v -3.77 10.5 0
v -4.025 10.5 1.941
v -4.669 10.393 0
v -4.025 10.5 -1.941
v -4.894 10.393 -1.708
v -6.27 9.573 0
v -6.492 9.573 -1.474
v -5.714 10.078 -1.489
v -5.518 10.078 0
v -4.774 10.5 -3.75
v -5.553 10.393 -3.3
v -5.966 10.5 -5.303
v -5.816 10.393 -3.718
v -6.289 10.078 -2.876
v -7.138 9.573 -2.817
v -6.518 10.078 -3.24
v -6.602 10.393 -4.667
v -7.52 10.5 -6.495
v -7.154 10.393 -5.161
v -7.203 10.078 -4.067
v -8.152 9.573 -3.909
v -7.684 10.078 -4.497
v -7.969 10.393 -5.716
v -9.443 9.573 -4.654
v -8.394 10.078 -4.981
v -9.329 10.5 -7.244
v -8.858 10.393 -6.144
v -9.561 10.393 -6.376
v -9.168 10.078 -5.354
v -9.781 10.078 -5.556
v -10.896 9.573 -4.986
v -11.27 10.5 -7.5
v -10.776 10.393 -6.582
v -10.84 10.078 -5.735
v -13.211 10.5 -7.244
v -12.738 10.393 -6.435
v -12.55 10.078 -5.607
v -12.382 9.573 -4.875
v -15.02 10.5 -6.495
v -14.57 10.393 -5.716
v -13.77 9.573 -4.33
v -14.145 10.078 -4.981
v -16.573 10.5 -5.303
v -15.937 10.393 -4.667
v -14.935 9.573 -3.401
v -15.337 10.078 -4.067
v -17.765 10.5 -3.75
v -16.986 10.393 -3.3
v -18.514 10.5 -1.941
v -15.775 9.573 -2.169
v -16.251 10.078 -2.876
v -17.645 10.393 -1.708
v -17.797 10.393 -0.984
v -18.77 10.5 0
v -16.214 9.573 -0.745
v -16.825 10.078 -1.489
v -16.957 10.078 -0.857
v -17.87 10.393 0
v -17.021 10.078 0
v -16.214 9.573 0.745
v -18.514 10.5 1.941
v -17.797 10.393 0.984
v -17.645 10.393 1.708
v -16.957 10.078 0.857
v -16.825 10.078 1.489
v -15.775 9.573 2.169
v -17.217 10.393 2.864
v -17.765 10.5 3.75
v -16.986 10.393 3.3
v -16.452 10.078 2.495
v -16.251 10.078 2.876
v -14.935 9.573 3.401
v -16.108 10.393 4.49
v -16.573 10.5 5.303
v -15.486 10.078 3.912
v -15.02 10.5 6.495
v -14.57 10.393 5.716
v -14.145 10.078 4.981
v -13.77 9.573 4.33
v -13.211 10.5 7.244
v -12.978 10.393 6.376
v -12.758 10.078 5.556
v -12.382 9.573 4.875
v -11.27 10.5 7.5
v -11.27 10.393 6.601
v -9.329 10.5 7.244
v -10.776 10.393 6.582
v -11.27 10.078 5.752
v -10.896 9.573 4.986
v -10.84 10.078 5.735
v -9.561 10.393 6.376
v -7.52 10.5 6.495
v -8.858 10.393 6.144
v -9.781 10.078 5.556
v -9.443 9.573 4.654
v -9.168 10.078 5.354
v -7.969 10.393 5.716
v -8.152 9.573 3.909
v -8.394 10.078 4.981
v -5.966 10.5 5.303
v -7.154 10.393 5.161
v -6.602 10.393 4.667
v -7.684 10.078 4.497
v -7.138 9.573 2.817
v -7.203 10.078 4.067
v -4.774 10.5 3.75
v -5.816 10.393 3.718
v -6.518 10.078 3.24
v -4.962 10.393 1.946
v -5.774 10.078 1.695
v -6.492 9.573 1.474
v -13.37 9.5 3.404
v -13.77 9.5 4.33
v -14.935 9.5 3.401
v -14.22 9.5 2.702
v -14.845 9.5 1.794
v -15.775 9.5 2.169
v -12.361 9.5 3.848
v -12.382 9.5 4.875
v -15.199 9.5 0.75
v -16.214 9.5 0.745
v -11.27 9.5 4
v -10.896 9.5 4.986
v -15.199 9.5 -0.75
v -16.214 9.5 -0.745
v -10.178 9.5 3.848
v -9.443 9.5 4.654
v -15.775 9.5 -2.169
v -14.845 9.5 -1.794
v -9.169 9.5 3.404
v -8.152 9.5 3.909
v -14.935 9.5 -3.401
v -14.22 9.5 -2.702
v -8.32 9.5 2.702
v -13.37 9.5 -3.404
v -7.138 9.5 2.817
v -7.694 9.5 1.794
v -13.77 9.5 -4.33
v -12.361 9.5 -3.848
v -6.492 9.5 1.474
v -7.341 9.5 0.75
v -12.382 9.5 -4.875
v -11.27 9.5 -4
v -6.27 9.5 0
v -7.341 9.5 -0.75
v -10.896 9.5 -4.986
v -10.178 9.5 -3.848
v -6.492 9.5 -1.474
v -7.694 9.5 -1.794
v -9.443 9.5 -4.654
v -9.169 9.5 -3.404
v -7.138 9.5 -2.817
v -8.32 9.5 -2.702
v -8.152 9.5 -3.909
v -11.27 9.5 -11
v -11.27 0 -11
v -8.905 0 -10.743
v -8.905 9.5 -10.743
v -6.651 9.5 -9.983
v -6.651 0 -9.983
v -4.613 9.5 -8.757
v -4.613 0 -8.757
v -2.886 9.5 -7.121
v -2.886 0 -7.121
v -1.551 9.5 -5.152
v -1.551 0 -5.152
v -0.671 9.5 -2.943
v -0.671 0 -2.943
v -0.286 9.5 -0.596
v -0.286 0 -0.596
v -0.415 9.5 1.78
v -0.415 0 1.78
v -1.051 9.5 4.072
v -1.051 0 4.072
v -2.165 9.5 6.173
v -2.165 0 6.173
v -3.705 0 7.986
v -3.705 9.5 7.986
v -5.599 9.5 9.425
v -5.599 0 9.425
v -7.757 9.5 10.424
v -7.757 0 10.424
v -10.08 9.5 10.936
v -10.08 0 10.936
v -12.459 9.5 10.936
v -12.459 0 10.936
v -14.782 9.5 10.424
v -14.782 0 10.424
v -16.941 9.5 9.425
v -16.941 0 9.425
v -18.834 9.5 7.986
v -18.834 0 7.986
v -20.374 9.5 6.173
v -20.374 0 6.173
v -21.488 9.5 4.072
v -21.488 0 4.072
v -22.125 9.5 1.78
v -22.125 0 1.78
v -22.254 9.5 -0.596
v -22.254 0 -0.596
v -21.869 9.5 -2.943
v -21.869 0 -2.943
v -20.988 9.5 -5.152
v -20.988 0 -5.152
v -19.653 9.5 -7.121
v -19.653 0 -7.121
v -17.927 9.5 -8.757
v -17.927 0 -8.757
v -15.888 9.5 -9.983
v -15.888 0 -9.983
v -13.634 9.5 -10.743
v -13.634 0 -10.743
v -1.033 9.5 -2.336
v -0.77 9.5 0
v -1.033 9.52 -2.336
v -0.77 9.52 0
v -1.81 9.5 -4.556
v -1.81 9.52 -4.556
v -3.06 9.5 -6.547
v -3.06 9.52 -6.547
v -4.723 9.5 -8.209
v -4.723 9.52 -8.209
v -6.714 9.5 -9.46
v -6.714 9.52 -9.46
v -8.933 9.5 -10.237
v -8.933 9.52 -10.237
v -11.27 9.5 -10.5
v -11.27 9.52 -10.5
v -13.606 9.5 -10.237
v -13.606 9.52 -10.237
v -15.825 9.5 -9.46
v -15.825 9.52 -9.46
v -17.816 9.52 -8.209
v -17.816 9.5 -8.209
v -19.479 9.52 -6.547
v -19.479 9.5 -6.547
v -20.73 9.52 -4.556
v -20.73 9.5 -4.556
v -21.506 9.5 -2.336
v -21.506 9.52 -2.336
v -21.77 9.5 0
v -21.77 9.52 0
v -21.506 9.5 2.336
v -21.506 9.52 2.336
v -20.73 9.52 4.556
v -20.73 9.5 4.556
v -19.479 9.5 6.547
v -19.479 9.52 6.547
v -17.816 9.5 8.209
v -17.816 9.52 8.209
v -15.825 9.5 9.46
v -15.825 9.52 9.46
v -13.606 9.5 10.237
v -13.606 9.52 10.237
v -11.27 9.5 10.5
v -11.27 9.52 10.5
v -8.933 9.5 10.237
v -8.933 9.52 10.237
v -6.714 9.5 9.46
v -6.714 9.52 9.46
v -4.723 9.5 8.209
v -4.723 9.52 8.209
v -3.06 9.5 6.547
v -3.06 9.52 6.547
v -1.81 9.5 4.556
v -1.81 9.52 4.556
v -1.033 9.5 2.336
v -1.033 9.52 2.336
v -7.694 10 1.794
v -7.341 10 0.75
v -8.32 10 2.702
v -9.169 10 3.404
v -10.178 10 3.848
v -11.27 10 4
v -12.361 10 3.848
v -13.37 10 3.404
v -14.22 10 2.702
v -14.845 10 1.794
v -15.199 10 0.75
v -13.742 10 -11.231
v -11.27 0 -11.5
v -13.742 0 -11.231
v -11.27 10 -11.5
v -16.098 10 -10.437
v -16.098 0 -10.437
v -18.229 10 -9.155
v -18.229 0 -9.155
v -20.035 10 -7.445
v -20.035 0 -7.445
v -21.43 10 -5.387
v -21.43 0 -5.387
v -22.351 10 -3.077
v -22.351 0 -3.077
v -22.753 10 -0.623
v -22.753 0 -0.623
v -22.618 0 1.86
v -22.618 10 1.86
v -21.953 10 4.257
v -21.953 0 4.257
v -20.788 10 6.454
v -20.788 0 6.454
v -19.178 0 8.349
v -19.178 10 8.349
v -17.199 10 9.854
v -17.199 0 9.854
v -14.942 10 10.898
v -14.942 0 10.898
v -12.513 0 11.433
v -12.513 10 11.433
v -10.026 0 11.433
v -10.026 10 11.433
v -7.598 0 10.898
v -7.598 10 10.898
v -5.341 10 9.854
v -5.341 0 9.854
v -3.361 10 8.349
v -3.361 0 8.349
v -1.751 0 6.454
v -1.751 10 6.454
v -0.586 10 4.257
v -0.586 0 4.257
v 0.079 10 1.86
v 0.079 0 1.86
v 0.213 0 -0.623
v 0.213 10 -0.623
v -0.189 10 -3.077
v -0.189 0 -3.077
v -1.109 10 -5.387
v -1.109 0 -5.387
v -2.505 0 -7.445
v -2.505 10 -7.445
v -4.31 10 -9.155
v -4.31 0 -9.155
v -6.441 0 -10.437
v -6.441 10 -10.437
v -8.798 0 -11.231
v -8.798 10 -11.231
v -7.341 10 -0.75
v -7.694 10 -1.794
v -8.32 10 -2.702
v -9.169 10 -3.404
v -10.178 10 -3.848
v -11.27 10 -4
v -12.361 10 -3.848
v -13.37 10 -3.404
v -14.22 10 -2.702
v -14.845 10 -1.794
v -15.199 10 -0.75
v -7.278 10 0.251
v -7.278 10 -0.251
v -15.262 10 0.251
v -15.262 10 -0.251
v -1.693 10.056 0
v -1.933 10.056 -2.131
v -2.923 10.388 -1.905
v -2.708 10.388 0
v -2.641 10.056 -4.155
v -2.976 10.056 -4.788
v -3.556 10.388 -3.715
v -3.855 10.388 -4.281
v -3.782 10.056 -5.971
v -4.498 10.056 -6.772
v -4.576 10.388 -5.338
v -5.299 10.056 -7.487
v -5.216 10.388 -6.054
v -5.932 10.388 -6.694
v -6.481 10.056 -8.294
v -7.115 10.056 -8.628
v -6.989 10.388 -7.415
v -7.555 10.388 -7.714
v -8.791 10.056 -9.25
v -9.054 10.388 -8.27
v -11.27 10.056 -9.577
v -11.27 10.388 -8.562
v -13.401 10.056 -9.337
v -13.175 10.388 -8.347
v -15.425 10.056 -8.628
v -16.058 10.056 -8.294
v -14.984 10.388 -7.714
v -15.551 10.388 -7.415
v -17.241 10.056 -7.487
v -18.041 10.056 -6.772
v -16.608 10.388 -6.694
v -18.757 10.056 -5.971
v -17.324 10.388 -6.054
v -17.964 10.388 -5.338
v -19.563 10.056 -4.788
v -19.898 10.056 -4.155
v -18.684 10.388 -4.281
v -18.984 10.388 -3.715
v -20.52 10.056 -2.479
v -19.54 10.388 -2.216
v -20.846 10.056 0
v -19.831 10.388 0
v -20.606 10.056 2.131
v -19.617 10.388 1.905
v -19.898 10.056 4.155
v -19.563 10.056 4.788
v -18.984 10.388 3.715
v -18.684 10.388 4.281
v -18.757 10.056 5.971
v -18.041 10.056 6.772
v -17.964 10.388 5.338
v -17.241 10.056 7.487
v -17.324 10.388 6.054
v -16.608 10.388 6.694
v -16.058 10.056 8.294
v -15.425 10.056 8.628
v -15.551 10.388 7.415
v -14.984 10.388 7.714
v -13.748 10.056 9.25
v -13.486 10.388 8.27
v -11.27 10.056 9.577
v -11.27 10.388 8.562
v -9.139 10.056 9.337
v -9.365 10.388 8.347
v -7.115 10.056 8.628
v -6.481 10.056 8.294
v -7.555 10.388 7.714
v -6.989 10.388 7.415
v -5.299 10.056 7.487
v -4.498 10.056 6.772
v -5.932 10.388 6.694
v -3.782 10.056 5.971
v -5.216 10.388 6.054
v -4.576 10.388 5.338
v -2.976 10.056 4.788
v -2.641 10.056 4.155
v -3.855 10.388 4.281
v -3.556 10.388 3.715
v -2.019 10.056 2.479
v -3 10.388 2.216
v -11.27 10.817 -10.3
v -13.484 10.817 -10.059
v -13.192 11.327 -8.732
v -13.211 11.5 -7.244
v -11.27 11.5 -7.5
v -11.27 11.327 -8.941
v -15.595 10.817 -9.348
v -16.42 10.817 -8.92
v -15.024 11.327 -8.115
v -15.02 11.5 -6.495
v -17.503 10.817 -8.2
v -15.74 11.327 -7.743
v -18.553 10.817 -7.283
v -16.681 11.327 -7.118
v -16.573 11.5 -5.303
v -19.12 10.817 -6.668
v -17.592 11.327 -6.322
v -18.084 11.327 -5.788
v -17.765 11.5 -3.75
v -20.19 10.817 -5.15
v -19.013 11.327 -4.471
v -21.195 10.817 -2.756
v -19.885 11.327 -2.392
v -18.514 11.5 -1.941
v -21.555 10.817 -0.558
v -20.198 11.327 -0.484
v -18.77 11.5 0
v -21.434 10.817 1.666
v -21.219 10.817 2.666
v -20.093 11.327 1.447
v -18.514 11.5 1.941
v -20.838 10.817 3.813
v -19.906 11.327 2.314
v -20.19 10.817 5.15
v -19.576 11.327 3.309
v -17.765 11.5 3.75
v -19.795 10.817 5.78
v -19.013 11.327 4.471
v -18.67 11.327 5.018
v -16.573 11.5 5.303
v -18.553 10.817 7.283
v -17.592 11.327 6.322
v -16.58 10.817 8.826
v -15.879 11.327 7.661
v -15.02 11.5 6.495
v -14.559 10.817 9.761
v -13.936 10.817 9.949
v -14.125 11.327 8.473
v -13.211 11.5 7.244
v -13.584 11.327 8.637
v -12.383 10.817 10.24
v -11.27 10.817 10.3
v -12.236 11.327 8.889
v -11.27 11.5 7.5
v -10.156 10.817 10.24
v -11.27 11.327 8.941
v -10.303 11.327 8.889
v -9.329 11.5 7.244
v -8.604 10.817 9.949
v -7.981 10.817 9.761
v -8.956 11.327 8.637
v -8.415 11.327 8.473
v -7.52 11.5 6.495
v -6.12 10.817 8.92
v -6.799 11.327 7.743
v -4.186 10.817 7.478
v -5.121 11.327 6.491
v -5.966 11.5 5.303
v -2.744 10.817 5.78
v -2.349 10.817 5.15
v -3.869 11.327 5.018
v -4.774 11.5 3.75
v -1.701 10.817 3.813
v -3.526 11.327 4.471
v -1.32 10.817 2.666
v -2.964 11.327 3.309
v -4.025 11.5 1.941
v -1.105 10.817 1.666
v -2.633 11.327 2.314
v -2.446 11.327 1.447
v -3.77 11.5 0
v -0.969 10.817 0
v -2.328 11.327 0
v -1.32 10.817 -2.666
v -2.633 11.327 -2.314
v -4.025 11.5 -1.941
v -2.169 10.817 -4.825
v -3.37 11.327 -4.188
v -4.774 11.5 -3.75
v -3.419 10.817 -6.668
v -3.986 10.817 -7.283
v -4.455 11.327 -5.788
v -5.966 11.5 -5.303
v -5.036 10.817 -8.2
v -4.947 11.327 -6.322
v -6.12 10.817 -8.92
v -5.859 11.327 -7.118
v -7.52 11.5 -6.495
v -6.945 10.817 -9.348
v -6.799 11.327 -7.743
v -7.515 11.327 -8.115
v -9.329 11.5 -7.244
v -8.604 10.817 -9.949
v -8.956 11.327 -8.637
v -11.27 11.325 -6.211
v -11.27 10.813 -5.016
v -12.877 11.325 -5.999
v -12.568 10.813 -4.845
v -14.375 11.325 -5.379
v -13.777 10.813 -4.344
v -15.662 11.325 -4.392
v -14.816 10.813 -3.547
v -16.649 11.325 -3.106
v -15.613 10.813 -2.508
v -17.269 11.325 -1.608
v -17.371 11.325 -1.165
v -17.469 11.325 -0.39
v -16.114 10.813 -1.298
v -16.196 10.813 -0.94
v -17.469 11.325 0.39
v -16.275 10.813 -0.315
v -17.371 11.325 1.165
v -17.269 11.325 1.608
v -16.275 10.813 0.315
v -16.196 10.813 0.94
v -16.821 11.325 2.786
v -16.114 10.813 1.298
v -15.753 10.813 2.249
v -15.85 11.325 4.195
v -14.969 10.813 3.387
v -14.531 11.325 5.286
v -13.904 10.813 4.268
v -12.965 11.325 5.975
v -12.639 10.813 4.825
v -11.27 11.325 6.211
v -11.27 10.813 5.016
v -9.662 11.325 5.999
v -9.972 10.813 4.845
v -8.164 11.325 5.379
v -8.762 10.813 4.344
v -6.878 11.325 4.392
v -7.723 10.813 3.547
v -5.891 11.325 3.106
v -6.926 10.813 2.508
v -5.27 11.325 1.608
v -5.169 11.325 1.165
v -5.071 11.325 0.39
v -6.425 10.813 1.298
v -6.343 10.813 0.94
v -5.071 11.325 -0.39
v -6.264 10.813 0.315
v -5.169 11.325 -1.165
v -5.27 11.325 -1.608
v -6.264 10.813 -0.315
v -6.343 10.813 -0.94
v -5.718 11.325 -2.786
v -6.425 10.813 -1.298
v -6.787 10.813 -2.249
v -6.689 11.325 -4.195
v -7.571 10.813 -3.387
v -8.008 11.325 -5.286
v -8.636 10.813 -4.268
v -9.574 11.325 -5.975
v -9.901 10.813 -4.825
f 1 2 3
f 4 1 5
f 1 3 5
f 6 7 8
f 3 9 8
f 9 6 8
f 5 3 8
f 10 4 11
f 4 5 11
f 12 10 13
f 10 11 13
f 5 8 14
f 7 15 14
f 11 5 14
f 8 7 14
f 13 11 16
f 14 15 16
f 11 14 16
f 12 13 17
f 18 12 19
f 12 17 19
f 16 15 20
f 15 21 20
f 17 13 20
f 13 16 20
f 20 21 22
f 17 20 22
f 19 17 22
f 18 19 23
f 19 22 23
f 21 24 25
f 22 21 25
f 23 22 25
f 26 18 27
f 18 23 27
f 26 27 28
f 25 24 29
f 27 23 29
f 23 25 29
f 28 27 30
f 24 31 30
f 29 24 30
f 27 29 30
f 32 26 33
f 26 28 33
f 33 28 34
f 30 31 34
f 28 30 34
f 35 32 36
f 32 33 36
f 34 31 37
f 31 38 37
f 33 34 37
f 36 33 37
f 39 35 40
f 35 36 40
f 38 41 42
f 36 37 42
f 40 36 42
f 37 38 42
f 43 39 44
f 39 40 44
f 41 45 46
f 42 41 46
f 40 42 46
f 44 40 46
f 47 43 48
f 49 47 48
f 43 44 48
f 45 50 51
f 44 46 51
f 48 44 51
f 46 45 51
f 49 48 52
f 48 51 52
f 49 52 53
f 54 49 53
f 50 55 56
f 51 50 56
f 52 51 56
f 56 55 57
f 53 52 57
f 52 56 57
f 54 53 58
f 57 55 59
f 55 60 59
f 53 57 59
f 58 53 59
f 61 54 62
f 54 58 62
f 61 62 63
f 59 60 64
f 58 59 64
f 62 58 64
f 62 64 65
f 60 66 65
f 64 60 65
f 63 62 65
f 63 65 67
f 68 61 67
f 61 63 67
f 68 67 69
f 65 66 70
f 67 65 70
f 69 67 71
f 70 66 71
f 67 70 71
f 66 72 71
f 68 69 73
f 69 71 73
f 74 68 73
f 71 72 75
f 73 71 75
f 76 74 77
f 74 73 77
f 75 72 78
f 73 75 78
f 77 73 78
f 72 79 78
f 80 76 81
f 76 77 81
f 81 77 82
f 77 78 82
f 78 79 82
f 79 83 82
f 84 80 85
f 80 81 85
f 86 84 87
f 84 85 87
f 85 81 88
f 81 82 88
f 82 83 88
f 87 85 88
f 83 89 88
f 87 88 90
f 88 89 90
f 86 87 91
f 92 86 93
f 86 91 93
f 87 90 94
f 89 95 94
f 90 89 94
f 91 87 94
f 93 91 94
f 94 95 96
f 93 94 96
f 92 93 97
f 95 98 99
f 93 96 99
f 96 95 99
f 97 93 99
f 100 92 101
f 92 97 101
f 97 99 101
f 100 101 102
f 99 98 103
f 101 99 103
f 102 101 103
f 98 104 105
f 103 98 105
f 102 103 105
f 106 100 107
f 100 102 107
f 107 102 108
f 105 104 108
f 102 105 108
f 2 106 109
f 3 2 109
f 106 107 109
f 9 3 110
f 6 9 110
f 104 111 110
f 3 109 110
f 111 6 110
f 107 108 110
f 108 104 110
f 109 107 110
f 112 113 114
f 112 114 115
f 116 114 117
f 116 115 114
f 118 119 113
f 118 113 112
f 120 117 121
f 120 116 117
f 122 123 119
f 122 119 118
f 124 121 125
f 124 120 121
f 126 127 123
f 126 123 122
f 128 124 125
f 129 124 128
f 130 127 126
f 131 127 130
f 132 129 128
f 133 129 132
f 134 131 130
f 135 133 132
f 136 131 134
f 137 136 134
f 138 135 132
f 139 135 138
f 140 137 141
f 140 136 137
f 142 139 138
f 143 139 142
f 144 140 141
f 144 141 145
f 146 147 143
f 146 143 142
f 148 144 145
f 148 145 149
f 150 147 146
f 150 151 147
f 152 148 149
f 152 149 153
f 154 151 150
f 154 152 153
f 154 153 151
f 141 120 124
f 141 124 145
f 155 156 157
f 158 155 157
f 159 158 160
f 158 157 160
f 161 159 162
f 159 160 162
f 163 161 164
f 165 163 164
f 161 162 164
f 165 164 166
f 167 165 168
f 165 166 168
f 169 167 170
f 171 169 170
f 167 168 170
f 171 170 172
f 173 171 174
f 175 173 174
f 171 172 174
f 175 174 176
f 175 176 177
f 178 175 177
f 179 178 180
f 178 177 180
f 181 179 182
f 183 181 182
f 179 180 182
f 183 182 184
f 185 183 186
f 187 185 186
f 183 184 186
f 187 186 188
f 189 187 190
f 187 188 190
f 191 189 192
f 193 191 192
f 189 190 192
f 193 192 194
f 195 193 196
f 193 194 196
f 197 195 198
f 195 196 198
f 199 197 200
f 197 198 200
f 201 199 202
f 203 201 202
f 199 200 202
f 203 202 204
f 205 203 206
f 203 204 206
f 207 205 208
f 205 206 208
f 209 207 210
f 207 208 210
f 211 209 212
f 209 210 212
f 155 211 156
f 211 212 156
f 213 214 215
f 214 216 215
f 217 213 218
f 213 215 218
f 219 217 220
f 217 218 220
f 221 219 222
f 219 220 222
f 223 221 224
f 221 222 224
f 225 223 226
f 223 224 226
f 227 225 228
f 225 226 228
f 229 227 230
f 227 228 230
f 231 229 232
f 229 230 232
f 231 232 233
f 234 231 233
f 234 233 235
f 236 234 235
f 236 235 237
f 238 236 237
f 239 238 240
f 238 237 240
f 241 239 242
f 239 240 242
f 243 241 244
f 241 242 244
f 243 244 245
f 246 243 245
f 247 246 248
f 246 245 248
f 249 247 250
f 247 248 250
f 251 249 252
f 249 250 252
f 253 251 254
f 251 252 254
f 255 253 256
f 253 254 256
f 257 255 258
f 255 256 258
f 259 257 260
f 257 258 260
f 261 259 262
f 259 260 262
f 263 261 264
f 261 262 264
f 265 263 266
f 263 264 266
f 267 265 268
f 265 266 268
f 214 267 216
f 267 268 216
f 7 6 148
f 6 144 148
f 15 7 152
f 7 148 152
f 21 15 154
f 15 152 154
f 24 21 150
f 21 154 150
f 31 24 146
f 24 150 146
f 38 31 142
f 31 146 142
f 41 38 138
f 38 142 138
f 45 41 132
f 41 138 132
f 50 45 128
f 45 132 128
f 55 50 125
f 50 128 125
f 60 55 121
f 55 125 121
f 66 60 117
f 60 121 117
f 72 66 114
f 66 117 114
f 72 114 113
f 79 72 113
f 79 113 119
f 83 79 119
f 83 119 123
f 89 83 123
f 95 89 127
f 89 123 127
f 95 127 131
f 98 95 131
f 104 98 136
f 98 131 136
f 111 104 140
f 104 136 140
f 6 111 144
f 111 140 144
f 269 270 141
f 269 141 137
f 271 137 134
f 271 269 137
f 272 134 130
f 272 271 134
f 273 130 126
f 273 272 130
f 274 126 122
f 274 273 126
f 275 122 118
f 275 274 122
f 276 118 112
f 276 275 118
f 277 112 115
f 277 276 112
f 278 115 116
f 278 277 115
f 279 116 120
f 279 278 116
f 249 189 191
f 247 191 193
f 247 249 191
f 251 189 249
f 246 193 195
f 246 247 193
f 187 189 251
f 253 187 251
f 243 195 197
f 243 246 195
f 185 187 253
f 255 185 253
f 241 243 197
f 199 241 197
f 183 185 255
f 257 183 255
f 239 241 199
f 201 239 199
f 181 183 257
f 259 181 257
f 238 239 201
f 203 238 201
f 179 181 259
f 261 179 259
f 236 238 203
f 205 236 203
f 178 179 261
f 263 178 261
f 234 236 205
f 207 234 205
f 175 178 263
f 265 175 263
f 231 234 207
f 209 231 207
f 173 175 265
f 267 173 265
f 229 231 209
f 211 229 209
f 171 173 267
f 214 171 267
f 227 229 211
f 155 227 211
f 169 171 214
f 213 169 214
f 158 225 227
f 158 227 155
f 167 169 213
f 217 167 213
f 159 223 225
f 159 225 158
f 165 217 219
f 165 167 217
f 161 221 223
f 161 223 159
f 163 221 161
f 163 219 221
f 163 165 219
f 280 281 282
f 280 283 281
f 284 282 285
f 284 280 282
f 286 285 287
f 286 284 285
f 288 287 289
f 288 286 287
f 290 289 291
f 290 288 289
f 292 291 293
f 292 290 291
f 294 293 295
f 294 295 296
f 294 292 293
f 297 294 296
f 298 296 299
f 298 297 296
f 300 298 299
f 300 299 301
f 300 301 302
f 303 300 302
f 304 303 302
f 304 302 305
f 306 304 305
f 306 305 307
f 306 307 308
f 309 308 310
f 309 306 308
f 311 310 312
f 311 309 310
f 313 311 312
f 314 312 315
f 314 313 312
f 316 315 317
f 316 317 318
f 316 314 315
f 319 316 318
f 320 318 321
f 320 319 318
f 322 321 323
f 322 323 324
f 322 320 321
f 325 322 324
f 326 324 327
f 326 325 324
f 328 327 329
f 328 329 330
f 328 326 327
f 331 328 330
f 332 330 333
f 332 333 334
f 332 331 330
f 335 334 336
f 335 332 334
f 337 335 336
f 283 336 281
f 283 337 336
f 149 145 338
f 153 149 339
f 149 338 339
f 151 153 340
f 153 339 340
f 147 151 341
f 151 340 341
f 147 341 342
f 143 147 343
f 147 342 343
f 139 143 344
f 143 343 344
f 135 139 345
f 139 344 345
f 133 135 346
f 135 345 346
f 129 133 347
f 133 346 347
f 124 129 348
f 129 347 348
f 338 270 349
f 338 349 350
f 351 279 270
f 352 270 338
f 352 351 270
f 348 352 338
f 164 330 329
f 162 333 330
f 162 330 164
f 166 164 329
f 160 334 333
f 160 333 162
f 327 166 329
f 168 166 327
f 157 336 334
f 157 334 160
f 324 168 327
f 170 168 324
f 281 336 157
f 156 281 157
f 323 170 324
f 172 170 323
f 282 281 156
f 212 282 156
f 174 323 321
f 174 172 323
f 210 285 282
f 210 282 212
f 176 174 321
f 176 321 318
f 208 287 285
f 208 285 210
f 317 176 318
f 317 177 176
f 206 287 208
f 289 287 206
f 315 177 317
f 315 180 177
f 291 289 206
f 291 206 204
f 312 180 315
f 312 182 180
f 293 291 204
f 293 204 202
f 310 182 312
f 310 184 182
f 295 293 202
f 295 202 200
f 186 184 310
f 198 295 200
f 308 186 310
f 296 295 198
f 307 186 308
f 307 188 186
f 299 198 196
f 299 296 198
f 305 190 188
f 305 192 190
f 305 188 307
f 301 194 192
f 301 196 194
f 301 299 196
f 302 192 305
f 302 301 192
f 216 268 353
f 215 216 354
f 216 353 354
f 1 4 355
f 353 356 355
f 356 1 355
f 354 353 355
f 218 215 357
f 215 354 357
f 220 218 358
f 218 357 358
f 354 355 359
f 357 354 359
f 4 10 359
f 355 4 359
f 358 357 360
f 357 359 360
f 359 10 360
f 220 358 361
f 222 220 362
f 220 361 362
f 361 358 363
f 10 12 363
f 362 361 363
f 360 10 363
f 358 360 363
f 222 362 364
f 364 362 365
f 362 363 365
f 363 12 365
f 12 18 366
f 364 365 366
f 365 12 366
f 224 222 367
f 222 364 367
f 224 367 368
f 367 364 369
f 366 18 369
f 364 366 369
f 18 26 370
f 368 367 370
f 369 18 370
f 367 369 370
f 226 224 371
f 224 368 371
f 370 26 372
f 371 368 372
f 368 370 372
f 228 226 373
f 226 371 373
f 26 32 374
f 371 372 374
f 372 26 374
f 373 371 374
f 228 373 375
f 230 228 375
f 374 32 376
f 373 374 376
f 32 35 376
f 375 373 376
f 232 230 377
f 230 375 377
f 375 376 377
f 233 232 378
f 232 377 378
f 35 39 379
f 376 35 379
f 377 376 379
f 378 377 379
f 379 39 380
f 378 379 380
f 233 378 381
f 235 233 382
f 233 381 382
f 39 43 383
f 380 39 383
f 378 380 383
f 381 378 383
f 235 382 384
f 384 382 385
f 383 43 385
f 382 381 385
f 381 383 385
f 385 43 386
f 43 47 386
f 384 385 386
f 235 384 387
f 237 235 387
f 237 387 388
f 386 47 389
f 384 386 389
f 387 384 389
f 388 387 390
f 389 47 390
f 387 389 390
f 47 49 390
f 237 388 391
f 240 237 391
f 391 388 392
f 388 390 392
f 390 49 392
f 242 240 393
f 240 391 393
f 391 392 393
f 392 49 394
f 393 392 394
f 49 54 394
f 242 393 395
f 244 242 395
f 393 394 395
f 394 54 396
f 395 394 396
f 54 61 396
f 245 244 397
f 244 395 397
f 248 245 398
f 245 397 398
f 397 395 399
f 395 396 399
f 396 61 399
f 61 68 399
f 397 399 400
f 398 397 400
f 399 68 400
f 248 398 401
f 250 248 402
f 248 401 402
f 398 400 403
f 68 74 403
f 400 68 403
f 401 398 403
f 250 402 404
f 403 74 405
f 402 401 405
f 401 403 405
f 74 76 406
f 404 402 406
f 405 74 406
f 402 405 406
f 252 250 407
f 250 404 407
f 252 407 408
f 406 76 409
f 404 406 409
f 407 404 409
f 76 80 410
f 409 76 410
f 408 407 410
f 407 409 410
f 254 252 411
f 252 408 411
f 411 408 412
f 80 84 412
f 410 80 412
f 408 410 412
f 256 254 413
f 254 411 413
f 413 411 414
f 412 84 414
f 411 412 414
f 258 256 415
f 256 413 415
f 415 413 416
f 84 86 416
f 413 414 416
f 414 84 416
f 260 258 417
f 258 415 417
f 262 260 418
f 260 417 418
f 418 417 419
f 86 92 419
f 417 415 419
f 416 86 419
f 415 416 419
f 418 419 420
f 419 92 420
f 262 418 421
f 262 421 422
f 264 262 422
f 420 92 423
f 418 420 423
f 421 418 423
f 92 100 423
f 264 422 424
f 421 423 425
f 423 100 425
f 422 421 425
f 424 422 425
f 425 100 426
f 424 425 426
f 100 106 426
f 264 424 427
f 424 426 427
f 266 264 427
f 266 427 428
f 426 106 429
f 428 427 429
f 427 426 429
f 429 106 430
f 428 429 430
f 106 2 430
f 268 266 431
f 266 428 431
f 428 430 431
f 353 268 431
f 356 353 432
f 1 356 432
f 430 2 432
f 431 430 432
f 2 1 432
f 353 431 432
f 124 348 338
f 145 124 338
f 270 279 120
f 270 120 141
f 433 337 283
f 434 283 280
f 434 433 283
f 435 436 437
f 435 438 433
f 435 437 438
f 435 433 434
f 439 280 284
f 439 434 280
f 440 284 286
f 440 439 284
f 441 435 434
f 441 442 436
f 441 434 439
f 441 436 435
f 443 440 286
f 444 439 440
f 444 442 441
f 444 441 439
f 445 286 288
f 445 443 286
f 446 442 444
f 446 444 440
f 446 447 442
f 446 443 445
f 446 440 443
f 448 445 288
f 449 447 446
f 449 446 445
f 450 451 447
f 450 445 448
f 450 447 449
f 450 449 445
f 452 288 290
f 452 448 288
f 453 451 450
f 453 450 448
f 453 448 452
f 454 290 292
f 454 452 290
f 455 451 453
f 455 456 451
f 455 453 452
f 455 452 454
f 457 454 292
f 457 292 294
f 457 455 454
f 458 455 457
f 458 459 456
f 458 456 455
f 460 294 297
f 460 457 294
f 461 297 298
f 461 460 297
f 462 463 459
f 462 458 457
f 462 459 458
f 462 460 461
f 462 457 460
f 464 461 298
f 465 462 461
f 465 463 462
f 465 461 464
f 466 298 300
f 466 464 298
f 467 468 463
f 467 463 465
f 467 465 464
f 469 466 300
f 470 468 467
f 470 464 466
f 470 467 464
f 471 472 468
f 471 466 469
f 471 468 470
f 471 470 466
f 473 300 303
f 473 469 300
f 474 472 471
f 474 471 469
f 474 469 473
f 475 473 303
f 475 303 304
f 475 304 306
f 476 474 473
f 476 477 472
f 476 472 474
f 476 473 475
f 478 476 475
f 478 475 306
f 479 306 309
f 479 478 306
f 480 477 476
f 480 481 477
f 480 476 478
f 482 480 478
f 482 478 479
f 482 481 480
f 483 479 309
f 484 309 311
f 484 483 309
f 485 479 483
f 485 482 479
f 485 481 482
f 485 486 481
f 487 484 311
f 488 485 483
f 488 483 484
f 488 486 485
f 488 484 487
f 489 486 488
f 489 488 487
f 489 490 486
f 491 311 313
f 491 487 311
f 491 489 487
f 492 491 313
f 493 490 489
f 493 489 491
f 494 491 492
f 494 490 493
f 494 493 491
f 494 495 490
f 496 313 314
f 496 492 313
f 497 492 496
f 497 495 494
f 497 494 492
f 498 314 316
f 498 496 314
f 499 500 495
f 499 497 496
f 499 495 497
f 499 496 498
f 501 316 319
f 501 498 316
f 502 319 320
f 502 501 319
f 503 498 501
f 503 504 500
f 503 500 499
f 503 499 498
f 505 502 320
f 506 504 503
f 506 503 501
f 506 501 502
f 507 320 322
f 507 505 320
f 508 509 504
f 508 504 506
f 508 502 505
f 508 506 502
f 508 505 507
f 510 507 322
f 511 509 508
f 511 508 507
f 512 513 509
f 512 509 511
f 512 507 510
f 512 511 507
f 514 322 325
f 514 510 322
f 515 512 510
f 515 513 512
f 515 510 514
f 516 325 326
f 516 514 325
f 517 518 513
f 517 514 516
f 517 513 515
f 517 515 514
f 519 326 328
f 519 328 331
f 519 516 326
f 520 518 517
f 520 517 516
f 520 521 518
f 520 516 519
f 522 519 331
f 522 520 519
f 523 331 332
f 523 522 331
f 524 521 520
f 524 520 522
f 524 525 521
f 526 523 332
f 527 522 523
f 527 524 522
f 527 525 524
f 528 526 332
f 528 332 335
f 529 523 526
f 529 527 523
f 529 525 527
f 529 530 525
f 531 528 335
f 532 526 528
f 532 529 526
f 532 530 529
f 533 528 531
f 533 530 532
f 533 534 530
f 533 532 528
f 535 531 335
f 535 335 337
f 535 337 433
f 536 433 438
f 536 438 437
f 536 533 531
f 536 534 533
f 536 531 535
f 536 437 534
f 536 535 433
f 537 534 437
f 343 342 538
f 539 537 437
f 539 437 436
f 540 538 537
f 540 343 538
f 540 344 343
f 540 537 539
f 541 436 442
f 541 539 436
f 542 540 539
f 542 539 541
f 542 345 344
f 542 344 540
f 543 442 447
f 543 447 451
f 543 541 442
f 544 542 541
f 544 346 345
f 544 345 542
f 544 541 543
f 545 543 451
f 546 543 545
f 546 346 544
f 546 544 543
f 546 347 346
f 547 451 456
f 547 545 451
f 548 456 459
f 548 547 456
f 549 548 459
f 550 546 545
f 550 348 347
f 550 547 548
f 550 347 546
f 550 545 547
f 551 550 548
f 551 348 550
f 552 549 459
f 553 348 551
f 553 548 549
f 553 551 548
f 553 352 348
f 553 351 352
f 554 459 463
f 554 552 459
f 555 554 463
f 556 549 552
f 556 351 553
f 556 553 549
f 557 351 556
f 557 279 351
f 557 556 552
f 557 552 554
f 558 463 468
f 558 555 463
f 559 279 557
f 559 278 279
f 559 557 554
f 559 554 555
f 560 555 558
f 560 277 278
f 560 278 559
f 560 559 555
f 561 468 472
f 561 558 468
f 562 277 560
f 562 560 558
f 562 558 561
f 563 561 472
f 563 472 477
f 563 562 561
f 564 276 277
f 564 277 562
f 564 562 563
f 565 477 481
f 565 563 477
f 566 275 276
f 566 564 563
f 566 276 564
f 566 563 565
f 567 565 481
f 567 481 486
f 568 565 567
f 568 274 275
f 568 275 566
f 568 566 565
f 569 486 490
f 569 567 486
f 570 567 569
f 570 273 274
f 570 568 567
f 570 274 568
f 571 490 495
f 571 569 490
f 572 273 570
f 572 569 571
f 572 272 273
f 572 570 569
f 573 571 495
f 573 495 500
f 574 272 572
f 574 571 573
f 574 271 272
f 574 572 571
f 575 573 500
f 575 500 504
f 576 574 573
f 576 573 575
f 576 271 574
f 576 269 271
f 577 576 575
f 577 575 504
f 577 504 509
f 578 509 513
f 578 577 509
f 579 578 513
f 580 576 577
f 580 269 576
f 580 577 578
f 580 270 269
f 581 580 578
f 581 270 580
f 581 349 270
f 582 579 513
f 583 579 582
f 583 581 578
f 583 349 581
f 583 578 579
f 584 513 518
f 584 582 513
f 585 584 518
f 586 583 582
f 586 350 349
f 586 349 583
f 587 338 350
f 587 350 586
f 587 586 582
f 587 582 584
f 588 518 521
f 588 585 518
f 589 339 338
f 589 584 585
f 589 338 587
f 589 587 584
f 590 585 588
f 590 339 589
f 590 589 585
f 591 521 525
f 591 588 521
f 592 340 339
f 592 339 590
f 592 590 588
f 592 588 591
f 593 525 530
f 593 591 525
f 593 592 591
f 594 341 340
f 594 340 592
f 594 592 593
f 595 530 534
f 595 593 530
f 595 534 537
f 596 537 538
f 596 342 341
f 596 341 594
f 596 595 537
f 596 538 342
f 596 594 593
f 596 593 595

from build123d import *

# Parameters (mm, degrees)
CORTAR_EXTRUIR1_DEPTH = 10
CROQUIS3_R            = 11
CORTAR_EXTRUIR3_DEPTH = 9.5


# Read off the part's stored shape, not the designer's step: Vaciado4
with BuildPart() as part:
    # Croquis1 → Revolución1 (revolve)
    with BuildSketch(Plane.XY, mode=Mode.PRIVATE) as revoluci_n1_sk:
        with BuildLine():
            Line((-22.7696793, 0), (-22.7696793, 10))
            ThreePointArc((-22.7696793, 10), (-20.905680237, 11.112669164), (-18.7696793, 11.5))
            ThreePointArc((-18.7696793, 11.5), (-16.865736024, 11.109200978), (-15.2696793, 10))
            Line((-15.2696793, 10), (-11.2696793, 10))
            Line((-11.2696793, 10), (-11.2696793, 0))
            Line((-11.2696793, 0), (-22.7696793, 0))
        make_face()
    revolve(revoluci_n1_sk.sketch.rotate(Axis((-11.2696793, 0, 0), (0, 1, 0)), 270), axis=Axis((-11.2696793, 0, 0), (0, 1, 0)))

    # Croquis2 → Cortar-Extruir1 (cut)
    with BuildSketch(Plane(origin=(0, 10, 0), x_dir=(1, 0, 0), z_dir=(0, 1, 0))):
        with BuildLine():
            Line((-15.198737712, 0.75), (-7.340620889, 0.75))
            ThreePointArc((-7.340620889, 0.75), (-11.2696793, 4), (-15.198737712, 0.75))
        make_face()
        with BuildLine():
            Line((-15.198737712, -0.75), (-7.340620889, -0.75))
            ThreePointArc((-7.340620889, -0.75), (-11.2696793, -4), (-15.198737712, -0.75))
        make_face()
    extrude(amount=-CORTAR_EXTRUIR1_DEPTH, mode=Mode.SUBTRACT)

    # Croquis3 → Cortar-Extruir3 (cut)
    with BuildSketch(Plane.XZ):
        with Locations(Location((-11.2696793, 0, 0), (0, 0, 270))):
            Circle(CROQUIS3_R)
    extrude(amount=-CORTAR_EXTRUIR3_DEPTH, mode=Mode.SUBTRACT)

    # Vaciado4 outline → Vaciado4 (revolve, cut)
    with BuildSketch(Plane(origin=(-11.2696793, 0, 0), x_dir=(1, 0, 0), z_dir=(0, 0, 1))):
        with BuildLine():
            Line((10.5, 9.5), (10.5, 9.520357417))
            ThreePointArc((10.5, 9.520357417), (9.077949586, 10.248886951), (7.5, 10.5))
            ThreePointArc((7.5, 10.5), (6.166764081, 10.260679247), (5, 9.572599296))
            Line((5, 9.572599296), (5, 9.5))
            Line((5, 9.5), (10.5, 9.5))
        make_face()
    revolve(axis=Axis((-11.2696793, 0, 0), (0, 1, 0)), mode=Mode.SUBTRACT)


solid = part.part
